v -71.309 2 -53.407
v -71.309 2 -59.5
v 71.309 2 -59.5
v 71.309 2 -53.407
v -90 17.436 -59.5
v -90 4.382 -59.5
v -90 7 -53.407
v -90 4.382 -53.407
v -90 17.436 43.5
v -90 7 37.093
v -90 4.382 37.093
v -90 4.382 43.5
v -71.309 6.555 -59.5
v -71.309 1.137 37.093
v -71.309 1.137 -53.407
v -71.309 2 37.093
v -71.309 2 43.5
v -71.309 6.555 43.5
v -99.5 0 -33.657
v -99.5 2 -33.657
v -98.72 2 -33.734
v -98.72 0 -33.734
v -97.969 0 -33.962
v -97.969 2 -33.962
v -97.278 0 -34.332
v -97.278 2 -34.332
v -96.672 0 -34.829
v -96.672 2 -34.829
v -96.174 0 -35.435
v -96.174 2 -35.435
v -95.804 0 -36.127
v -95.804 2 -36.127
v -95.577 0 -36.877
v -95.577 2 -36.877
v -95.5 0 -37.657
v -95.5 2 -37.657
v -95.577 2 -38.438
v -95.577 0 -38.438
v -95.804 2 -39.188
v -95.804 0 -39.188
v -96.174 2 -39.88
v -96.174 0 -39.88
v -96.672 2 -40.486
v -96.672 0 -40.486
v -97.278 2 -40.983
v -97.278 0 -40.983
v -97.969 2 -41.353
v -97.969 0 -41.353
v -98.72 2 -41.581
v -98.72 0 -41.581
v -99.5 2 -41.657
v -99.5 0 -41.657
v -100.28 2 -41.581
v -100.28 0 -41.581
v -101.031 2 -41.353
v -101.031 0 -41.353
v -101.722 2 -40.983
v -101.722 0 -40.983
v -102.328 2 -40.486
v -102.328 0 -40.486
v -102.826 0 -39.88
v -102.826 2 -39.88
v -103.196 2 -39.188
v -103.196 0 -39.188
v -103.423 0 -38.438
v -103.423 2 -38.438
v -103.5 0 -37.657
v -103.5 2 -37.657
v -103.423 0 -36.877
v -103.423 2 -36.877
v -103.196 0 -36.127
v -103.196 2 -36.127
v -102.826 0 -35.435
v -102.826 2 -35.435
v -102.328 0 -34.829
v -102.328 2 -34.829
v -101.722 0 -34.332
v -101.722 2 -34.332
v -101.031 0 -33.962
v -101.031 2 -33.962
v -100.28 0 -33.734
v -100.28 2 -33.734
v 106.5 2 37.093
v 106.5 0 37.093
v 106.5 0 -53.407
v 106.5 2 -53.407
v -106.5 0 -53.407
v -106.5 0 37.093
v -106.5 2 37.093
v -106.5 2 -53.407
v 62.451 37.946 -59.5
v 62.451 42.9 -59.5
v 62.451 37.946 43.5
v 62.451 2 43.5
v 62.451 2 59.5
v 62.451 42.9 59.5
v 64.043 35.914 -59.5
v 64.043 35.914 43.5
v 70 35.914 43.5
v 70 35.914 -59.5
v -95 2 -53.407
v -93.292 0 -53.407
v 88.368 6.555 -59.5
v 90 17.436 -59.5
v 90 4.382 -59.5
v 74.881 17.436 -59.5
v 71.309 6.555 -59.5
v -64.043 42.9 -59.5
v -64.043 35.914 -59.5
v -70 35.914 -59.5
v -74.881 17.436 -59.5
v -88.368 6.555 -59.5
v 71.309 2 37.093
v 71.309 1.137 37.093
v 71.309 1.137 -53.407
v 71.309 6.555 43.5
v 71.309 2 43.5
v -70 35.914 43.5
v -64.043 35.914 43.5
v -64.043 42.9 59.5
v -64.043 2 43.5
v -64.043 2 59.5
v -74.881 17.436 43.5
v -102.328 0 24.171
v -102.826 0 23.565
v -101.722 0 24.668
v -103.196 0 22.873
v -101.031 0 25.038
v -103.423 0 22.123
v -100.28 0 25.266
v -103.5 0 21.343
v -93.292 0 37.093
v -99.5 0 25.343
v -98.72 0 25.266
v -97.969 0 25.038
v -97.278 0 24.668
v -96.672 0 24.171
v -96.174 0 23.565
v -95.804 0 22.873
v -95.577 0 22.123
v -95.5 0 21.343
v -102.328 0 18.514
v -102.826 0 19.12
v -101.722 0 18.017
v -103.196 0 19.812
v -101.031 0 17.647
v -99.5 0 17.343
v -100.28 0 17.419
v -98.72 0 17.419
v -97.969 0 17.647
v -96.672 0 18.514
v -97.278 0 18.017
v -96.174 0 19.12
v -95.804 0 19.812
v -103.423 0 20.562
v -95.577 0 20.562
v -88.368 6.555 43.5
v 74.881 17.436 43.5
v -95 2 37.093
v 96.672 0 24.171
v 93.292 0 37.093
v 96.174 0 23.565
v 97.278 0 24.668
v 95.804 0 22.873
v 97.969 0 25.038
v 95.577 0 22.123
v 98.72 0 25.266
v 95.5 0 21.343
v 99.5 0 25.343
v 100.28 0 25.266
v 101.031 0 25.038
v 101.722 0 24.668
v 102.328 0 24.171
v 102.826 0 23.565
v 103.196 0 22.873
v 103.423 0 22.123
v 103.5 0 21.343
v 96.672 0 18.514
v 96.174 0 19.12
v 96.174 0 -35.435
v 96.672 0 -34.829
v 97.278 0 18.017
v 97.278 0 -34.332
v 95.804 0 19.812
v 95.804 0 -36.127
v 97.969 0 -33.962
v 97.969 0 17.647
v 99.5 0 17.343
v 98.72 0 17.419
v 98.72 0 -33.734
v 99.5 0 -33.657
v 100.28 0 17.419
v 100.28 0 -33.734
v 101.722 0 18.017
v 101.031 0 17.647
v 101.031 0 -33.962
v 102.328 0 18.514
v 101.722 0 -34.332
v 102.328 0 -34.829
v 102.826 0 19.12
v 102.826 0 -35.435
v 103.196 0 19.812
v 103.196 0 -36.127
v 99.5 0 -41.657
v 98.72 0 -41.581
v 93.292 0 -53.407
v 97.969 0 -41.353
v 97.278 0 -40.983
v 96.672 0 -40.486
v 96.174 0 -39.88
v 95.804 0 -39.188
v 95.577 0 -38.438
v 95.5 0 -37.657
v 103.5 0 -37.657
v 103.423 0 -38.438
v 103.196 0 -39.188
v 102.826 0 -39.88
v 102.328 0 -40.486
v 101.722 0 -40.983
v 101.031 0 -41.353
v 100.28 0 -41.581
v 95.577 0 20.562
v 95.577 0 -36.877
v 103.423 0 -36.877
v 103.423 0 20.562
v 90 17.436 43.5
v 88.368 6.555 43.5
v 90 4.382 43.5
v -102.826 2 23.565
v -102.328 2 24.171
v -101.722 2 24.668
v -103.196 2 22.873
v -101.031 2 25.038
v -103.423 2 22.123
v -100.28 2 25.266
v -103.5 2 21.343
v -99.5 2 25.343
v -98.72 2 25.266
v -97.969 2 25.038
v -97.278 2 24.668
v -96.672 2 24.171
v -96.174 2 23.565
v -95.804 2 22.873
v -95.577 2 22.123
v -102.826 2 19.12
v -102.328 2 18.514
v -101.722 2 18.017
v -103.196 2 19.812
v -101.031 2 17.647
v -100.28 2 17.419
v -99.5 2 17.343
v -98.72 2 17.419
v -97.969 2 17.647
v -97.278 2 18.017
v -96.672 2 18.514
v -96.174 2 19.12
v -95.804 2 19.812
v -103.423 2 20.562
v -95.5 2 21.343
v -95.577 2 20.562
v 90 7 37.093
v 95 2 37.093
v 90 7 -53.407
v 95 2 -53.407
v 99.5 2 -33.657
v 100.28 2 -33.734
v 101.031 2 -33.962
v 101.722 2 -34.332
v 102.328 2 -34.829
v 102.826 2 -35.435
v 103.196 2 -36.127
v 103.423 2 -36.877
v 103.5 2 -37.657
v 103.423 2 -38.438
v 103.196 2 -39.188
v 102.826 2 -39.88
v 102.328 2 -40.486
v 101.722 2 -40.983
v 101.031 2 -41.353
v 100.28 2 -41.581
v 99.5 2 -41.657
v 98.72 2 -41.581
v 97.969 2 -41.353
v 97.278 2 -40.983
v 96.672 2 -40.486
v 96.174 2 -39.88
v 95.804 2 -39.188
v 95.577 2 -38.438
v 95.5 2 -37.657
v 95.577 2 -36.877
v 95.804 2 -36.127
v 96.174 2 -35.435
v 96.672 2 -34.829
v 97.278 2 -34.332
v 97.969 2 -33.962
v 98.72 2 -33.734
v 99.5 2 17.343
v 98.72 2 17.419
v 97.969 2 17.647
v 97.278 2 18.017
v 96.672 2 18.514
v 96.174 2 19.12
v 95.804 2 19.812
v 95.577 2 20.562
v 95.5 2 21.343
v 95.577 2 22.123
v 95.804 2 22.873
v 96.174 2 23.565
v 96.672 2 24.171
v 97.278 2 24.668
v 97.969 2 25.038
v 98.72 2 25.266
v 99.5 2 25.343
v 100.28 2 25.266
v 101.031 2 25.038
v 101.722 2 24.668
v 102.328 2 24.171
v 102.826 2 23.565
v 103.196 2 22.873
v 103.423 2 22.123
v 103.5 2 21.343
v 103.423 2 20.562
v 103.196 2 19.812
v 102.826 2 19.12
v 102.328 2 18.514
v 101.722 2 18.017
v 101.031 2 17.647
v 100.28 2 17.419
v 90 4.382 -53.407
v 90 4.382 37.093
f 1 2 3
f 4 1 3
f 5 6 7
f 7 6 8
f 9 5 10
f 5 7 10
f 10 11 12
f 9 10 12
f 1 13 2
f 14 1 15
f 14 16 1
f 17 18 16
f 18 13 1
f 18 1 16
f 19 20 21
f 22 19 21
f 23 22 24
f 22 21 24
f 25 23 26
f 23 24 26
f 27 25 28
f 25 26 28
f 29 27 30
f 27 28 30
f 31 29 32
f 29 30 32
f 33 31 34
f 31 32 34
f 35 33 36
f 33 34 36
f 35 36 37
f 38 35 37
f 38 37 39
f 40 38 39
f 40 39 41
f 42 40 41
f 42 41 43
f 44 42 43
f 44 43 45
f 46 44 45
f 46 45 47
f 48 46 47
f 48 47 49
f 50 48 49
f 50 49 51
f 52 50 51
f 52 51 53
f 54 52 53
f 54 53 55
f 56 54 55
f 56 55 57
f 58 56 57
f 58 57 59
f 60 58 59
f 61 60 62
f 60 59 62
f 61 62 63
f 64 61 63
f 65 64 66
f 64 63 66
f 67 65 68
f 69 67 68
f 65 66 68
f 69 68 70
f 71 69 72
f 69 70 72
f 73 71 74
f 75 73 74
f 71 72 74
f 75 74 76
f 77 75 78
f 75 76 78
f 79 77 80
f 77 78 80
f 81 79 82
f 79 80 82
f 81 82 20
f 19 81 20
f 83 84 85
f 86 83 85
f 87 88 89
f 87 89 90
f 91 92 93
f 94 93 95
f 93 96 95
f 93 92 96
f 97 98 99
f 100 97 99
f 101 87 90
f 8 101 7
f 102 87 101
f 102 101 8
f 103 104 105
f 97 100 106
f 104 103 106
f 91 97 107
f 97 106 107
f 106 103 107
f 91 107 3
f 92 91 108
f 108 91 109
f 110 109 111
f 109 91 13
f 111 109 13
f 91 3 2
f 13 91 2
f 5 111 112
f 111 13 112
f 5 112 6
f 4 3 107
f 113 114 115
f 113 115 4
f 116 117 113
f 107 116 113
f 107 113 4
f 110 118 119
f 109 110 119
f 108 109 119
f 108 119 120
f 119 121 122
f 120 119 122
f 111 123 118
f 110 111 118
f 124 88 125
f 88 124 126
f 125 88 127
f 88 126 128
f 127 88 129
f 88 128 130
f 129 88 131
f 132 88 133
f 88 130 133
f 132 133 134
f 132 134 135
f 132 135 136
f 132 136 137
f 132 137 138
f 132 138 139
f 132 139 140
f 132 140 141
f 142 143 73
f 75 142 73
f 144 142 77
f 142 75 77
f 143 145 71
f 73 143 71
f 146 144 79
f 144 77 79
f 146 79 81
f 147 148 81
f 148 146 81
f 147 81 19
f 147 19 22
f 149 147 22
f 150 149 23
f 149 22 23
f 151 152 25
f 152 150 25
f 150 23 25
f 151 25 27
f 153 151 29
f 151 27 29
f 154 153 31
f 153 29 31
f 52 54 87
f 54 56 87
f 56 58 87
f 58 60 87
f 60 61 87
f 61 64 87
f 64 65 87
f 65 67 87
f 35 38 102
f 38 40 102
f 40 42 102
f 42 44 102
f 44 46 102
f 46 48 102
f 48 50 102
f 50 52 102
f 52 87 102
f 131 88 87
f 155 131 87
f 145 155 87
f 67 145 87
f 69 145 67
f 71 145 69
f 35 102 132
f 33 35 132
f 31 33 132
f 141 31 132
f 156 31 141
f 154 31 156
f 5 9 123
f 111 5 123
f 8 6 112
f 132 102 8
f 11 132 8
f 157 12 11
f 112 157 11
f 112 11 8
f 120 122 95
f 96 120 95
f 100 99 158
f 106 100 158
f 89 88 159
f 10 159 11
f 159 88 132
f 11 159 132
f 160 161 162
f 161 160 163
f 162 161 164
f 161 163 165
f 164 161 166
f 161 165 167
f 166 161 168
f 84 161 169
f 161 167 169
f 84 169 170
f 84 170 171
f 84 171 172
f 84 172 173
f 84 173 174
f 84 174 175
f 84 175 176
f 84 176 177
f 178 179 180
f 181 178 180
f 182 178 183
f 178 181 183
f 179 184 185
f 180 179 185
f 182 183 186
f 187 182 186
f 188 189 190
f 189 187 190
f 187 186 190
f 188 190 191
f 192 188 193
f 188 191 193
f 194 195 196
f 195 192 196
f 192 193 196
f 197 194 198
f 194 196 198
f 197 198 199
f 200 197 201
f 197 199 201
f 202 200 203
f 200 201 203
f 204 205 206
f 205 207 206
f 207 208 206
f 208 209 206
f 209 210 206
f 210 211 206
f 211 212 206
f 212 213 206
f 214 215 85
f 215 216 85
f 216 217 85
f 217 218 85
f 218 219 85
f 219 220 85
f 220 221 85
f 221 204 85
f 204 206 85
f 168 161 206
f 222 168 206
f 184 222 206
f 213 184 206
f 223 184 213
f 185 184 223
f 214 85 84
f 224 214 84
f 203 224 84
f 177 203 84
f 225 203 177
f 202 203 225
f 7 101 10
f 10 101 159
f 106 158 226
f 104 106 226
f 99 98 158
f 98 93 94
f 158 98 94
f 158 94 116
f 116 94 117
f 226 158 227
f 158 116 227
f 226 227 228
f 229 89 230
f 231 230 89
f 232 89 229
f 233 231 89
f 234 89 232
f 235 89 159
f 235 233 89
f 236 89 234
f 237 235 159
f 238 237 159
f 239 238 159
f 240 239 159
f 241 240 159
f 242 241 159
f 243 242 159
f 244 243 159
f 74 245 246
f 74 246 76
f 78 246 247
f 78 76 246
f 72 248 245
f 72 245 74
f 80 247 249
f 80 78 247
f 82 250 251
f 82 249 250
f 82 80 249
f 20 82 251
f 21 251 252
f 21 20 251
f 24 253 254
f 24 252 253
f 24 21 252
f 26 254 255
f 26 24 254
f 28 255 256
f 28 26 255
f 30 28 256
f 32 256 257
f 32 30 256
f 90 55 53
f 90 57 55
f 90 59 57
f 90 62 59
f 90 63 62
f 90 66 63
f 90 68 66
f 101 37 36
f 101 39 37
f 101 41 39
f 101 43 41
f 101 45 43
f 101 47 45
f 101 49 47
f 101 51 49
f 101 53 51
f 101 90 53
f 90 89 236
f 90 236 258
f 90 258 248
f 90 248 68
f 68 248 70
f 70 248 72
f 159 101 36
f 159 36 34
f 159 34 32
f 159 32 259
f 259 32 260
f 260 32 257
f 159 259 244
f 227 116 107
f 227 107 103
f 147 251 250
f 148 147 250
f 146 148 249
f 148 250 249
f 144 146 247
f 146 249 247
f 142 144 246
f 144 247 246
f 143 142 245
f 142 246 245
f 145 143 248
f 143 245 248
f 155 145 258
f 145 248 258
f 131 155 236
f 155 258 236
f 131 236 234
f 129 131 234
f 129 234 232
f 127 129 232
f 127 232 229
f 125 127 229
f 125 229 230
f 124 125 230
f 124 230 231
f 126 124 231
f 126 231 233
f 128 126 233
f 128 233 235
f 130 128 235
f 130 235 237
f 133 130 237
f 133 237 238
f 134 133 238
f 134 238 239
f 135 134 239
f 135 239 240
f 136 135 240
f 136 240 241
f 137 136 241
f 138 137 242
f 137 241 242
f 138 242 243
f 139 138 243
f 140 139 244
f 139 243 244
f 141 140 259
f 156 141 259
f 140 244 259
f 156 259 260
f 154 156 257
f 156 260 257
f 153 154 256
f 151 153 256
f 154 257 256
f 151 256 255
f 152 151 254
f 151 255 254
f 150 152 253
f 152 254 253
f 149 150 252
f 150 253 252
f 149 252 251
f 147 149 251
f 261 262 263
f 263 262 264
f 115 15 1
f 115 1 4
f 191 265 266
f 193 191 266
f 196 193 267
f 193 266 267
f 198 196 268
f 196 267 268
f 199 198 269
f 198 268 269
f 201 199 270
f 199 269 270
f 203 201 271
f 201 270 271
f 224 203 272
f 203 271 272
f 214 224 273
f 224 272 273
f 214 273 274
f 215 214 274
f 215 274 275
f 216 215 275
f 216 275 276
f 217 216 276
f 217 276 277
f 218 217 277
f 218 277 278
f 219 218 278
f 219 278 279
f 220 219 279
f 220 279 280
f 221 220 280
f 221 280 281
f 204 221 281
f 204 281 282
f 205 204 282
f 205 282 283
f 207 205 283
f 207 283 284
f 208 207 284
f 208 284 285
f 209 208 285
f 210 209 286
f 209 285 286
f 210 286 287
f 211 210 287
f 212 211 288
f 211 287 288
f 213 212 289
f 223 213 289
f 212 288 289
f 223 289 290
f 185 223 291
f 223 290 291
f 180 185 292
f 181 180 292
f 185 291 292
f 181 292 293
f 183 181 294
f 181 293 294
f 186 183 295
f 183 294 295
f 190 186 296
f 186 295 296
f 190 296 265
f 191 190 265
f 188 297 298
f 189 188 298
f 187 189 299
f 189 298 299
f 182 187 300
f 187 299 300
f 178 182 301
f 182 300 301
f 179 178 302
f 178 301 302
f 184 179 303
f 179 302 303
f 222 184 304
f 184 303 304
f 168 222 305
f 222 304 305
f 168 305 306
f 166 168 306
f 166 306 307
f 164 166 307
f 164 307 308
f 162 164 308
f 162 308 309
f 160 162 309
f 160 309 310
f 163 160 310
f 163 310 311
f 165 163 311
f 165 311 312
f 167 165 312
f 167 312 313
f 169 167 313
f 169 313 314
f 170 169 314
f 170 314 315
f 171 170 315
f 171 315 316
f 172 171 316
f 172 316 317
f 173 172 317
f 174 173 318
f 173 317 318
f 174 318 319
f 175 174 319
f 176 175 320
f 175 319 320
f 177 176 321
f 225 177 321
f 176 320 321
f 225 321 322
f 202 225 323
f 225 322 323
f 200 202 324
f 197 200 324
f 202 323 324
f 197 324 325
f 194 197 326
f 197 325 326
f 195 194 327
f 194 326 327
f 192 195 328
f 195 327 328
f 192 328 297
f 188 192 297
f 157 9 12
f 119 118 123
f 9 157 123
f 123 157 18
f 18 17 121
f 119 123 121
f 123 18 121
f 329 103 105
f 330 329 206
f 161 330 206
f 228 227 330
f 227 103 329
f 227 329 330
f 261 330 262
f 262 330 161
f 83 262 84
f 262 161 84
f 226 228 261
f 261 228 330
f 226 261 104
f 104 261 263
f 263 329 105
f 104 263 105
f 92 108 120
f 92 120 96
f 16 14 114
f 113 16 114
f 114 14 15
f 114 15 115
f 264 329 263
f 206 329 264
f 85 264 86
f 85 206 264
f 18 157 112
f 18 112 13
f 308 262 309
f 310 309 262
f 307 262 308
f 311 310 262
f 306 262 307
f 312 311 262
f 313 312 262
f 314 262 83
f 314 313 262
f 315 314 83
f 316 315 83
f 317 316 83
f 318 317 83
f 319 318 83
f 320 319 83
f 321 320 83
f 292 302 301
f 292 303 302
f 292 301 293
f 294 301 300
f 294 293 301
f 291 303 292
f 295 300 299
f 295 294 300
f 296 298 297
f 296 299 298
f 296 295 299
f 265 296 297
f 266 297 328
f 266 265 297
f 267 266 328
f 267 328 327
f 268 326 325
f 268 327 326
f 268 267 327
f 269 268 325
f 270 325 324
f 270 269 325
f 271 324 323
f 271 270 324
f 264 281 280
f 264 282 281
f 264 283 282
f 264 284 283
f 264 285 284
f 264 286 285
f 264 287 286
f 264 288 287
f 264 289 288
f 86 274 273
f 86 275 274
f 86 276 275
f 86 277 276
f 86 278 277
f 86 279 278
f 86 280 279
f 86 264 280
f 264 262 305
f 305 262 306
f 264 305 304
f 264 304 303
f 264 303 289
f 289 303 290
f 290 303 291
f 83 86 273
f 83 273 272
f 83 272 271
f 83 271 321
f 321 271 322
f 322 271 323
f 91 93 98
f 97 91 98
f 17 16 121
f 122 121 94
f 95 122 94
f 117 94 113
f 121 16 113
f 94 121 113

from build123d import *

# Parameters (mm, degrees)
SKETCH7_W           = 213
SKETCH7_H           = 90.5
BOSS_EXTRUDE1_DEPTH = 2
BOSS_EXTRUDE2_DEPTH = 40.9
CHAMFER1_SIZE       = 5
CUT_EXTRUDE1_DEPTH  = 166.359184807
CUT_EXTRUDE2_DEPTH  = 166.359184807
SKETCH11_R          = 4
CUT_EXTRUDE3_DEPTH  = 40.9


with BuildPart() as part:
    # Sketch7 → Boss-Extrude1 (new body)
    with BuildSketch(Plane(origin=(0, 0, 0), x_dir=(1, 0, 0), z_dir=(0, 1, 0))):
        with Locations((0, 8.157414363)):
            Rectangle(SKETCH7_W, SKETCH7_H)
    extrude(amount=BOSS_EXTRUDE1_DEPTH)

    # Sketch8 → Boss-Extrude2 (add)
    with BuildSketch(Plane(origin=(0, 2, 0), x_dir=(1, 0, 0), z_dir=(0, 1, 0))):
        Polygon((-90, 59.5), (-90, -43.5), (-64.043073189, -43.5), (-64.043073189, -59.5), (62.450636704, -59.5), (62.450636704, -43.5), (90, -43.5), (90, 59.5), align=None)
    extrude(amount=BOSS_EXTRUDE2_DEPTH)

    # Chamfer1
    chamfer1_edges = [part.edges().sort_by_distance(p)[0] for p in [
        (90, 2, -8.157414363),
        (-90, 2, -8.157414363),
    ]]
    chamfer(chamfer1_edges, length=CHAMFER1_SIZE)

    # Sketch9 → Cut-Extrude1 (cut, through all)
    with BuildSketch(Plane.XY.offset(59.5)):
        Polygon((-93.291667838, 0), (-88.36780993, 6.554671328), (-71.309248996, 6.554671328), (-71.309248996, 1.137273466), (71.309248996, 1.137273466), (71.309248996, 6.554671328), (88.36780993, 6.554671328), (93.291667838, 0), (93.291667838, -4.012269233), (-93.291667838, -4.012269233), align=None)
    extrude(amount=-CUT_EXTRUDE1_DEPTH, mode=Mode.SUBTRACT)

    # Sketch10 → Cut-Extrude2 (cut, through all)
    with BuildSketch(Plane.XY.offset(59.5)):
        Polygon((-90, 53.559109073), (-90, 17.435932261), (-74.881220668, 17.435932261), (-70.000468563, 35.913866357), (-64.043073189, 35.913866357), (-64.043073189, 42.9), (-58.569611619, 42.9), (58.569611619, 42.9), (62.450636704, 42.9), (62.450636704, 37.946396222), (64.043073189, 35.913866357), (70.000468563, 35.913866357), (74.881220668, 17.435932261), (90, 17.435932261), (90, 53.559109073), align=None)
    extrude(amount=-CUT_EXTRUDE2_DEPTH, mode=Mode.SUBTRACT)

    # Sketch11 → Cut-Extrude3 (cut)
    with BuildSketch(Plane(origin=(0, 2, 0), x_dir=(1, 0, 0), z_dir=(0, 1, 0))):
        with Locations(Location((99.5, 37.657414363, 0), (0, 0, 270))):
            Circle(SKETCH11_R)
        with Locations(Location((-99.5, 37.657414363, 0), (0, 0, 270))):
            Circle(SKETCH11_R)
        with Locations(Location((-99.5, -21.342585637, 0), (0, 0, 90))):
            Circle(SKETCH11_R)
        with Locations(Location((99.5, -21.342585637, 0), (0, 0, 90))):
            Circle(SKETCH11_R)
    extrude(amount=-CUT_EXTRUDE3_DEPTH, mode=Mode.SUBTRACT)


solid = part.part
